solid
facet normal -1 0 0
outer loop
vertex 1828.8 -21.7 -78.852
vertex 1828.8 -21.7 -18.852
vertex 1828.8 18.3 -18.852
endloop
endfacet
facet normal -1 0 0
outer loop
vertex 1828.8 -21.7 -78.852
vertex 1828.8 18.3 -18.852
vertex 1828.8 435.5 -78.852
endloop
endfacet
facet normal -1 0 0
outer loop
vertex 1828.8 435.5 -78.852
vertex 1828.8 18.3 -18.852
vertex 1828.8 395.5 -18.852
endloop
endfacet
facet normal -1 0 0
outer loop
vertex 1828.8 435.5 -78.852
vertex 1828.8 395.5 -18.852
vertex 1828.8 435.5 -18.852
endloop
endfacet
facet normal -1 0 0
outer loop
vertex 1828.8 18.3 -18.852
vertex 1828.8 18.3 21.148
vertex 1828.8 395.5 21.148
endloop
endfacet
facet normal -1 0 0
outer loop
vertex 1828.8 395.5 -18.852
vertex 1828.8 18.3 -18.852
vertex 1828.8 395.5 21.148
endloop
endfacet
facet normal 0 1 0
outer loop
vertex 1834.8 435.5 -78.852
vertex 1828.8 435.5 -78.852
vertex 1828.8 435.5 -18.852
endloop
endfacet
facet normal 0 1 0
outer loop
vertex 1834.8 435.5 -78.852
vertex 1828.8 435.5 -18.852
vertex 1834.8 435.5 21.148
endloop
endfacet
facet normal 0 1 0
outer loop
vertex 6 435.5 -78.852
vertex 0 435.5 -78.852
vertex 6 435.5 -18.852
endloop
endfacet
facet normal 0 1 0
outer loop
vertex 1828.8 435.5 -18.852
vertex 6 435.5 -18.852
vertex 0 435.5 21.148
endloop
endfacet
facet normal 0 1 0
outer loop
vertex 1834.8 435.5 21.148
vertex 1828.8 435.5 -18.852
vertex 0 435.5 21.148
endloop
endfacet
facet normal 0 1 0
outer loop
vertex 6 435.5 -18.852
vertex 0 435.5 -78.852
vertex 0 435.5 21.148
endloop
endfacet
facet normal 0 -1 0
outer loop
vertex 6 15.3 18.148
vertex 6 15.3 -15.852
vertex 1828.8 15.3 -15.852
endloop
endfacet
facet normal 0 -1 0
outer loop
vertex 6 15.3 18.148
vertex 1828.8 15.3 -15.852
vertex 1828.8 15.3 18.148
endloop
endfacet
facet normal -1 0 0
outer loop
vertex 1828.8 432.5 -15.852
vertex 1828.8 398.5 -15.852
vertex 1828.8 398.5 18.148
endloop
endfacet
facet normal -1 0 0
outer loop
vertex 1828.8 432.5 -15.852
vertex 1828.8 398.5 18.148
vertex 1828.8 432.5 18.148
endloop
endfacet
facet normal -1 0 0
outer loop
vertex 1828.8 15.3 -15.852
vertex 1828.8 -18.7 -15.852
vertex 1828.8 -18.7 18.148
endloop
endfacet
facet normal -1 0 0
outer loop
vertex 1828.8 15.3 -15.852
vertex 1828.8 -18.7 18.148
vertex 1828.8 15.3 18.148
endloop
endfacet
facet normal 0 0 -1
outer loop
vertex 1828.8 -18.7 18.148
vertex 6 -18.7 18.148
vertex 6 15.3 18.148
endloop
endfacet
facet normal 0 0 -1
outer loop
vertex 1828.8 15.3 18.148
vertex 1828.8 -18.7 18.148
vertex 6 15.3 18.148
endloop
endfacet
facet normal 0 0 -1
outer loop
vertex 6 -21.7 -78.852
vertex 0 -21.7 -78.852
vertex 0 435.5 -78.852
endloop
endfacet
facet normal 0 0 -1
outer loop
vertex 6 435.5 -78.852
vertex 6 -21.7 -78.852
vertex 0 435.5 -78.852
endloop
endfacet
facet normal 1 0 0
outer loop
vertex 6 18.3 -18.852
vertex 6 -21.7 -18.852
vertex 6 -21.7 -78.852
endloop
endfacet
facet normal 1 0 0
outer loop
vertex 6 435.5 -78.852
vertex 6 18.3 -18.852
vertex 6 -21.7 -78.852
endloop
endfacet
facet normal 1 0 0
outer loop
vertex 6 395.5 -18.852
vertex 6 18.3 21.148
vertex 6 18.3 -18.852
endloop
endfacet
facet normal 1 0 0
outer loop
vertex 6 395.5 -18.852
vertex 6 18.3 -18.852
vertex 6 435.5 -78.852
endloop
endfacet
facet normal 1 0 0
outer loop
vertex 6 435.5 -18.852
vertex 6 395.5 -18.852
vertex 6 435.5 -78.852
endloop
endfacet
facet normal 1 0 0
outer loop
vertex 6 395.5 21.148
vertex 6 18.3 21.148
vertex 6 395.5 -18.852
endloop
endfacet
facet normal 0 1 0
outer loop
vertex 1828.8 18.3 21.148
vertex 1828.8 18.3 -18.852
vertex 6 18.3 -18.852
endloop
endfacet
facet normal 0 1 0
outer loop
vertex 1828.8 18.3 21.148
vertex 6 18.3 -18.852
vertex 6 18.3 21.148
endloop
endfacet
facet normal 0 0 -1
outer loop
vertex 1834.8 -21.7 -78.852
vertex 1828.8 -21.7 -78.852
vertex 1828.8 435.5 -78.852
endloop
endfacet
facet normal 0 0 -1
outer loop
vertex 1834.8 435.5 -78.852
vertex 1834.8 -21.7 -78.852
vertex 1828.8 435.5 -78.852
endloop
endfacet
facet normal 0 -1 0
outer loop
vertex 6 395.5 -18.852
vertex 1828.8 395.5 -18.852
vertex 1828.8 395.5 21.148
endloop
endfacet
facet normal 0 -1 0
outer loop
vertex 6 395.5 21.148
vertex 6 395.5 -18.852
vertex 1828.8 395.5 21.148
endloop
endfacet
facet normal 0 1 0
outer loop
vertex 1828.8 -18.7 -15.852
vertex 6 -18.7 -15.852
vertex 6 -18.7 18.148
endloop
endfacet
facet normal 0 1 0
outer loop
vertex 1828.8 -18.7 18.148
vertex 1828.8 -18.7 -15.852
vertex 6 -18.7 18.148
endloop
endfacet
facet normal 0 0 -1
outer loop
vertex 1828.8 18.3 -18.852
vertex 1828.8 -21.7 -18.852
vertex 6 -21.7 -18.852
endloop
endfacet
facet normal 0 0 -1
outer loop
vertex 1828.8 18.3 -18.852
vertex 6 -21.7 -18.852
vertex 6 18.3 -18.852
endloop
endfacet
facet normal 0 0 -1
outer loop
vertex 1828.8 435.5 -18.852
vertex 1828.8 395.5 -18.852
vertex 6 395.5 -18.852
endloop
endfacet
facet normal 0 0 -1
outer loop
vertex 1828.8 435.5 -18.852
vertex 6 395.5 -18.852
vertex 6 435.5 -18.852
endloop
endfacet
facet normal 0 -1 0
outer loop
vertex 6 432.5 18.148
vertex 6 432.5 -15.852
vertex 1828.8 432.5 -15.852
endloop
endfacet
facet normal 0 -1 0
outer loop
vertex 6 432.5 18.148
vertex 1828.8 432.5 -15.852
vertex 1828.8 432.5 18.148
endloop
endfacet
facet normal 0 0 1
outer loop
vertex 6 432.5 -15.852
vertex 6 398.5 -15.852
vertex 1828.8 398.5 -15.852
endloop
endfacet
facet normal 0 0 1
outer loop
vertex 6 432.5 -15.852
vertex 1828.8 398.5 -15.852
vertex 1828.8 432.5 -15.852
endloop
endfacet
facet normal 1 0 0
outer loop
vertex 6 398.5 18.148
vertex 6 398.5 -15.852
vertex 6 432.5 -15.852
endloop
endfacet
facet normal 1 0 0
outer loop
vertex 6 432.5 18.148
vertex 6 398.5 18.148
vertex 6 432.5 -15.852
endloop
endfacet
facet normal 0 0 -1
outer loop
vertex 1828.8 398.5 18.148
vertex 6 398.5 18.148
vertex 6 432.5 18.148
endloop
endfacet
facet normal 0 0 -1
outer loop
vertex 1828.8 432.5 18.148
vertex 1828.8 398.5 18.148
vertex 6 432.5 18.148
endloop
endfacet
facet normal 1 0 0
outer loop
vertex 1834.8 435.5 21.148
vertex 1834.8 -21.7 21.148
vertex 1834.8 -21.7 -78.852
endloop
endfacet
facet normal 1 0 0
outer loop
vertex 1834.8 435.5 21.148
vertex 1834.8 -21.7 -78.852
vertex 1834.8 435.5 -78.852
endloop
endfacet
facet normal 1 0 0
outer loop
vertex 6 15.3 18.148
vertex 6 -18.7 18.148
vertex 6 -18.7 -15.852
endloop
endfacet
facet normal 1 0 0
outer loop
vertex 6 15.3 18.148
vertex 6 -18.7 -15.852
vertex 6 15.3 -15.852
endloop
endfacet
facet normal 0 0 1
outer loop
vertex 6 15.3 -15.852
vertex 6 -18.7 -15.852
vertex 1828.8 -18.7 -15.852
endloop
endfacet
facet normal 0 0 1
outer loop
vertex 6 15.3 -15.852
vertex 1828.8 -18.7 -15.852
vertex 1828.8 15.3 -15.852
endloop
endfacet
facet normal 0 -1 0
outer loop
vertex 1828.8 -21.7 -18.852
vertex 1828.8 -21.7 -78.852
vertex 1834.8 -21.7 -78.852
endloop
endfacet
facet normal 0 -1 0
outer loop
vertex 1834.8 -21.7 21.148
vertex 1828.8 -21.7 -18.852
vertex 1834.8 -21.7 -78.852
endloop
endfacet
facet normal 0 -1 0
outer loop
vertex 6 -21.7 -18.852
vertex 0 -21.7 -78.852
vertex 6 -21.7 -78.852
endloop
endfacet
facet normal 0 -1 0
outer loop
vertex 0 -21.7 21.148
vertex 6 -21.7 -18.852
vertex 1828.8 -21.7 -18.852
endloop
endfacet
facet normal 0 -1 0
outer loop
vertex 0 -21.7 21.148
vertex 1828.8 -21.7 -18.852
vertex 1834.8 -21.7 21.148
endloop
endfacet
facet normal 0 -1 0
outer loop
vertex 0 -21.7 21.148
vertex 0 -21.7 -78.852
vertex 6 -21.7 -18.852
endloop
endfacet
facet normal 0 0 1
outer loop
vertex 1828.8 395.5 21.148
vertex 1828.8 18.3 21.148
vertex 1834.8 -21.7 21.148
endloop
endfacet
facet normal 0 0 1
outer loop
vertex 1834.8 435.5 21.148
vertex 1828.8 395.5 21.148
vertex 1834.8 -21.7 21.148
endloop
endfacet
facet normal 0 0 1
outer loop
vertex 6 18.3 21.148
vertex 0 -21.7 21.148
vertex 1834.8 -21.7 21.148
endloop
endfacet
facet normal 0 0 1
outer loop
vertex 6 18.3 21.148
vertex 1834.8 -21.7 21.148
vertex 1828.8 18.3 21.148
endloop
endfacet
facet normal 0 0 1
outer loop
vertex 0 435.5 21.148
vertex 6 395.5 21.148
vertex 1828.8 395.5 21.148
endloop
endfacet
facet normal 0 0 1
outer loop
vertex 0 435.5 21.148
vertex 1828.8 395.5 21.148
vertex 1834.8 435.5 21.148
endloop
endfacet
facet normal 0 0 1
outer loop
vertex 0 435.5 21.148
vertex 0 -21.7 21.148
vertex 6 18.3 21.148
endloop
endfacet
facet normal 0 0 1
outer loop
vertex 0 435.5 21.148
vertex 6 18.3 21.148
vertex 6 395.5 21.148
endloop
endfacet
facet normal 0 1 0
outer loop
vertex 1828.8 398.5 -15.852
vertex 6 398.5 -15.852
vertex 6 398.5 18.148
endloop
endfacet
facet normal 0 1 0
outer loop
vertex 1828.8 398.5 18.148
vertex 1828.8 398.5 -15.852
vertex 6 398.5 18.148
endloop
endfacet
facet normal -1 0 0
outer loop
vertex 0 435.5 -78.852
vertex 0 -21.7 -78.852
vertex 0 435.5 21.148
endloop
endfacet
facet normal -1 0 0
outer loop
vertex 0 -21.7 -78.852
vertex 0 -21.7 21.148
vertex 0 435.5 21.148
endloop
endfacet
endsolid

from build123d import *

# Parameters (mm, degrees)
F0_W     = 40
F0_H     = 40
F0_W_2   = 34
F0_H_2   = 34
F1_DEPTH = 1828.8
F2_W     = 457.2
F2_H     = 100
F3_DEPTH = 6
F4_W     = 40
F4_H     = 40
F4_W_2   = 34
F4_H_2   = 34
F5_DEPTH = 1828.8
F6_W     = 457.2
F6_H     = 100
F7_DEPTH = 6


with BuildPart() as f1:
    # F0 (on Right) → F1 (new body)
    with BuildSketch(Plane.YZ):
        with Locations((-1.69964, 1.148437)):
            Rectangle(F0_W, F0_H)
        with Locations((-1.69964, 1.148437)):
            Rectangle(F0_W_2, F0_H_2, mode=Mode.SUBTRACT)
    extrude(amount=F1_DEPTH)

    # F2 (on Right) → F3 (join)
    with BuildSketch(Plane.YZ):
        with Locations((206.90036, -28.851563)):
            Rectangle(F2_W, F2_H)
    extrude(amount=F3_DEPTH)

    # F4 (on face) → F5 (join)
    with BuildSketch(Plane.YZ.offset(6)):
        with Locations((415.50036, 1.148437)):
            Rectangle(F4_W, F4_H)
        with Locations((415.50036, 1.148437)):
            Rectangle(F4_W_2, F4_H_2, mode=Mode.SUBTRACT)
    extrude(amount=F5_DEPTH)

    # F6 (on face) → F7 (join)
    with BuildSketch(Plane.YZ.offset(1828.8)):
        with Locations((206.90036, -28.851563)):
            Rectangle(F6_W, F6_H)
    extrude(amount=F7_DEPTH)


solid = f1.part
